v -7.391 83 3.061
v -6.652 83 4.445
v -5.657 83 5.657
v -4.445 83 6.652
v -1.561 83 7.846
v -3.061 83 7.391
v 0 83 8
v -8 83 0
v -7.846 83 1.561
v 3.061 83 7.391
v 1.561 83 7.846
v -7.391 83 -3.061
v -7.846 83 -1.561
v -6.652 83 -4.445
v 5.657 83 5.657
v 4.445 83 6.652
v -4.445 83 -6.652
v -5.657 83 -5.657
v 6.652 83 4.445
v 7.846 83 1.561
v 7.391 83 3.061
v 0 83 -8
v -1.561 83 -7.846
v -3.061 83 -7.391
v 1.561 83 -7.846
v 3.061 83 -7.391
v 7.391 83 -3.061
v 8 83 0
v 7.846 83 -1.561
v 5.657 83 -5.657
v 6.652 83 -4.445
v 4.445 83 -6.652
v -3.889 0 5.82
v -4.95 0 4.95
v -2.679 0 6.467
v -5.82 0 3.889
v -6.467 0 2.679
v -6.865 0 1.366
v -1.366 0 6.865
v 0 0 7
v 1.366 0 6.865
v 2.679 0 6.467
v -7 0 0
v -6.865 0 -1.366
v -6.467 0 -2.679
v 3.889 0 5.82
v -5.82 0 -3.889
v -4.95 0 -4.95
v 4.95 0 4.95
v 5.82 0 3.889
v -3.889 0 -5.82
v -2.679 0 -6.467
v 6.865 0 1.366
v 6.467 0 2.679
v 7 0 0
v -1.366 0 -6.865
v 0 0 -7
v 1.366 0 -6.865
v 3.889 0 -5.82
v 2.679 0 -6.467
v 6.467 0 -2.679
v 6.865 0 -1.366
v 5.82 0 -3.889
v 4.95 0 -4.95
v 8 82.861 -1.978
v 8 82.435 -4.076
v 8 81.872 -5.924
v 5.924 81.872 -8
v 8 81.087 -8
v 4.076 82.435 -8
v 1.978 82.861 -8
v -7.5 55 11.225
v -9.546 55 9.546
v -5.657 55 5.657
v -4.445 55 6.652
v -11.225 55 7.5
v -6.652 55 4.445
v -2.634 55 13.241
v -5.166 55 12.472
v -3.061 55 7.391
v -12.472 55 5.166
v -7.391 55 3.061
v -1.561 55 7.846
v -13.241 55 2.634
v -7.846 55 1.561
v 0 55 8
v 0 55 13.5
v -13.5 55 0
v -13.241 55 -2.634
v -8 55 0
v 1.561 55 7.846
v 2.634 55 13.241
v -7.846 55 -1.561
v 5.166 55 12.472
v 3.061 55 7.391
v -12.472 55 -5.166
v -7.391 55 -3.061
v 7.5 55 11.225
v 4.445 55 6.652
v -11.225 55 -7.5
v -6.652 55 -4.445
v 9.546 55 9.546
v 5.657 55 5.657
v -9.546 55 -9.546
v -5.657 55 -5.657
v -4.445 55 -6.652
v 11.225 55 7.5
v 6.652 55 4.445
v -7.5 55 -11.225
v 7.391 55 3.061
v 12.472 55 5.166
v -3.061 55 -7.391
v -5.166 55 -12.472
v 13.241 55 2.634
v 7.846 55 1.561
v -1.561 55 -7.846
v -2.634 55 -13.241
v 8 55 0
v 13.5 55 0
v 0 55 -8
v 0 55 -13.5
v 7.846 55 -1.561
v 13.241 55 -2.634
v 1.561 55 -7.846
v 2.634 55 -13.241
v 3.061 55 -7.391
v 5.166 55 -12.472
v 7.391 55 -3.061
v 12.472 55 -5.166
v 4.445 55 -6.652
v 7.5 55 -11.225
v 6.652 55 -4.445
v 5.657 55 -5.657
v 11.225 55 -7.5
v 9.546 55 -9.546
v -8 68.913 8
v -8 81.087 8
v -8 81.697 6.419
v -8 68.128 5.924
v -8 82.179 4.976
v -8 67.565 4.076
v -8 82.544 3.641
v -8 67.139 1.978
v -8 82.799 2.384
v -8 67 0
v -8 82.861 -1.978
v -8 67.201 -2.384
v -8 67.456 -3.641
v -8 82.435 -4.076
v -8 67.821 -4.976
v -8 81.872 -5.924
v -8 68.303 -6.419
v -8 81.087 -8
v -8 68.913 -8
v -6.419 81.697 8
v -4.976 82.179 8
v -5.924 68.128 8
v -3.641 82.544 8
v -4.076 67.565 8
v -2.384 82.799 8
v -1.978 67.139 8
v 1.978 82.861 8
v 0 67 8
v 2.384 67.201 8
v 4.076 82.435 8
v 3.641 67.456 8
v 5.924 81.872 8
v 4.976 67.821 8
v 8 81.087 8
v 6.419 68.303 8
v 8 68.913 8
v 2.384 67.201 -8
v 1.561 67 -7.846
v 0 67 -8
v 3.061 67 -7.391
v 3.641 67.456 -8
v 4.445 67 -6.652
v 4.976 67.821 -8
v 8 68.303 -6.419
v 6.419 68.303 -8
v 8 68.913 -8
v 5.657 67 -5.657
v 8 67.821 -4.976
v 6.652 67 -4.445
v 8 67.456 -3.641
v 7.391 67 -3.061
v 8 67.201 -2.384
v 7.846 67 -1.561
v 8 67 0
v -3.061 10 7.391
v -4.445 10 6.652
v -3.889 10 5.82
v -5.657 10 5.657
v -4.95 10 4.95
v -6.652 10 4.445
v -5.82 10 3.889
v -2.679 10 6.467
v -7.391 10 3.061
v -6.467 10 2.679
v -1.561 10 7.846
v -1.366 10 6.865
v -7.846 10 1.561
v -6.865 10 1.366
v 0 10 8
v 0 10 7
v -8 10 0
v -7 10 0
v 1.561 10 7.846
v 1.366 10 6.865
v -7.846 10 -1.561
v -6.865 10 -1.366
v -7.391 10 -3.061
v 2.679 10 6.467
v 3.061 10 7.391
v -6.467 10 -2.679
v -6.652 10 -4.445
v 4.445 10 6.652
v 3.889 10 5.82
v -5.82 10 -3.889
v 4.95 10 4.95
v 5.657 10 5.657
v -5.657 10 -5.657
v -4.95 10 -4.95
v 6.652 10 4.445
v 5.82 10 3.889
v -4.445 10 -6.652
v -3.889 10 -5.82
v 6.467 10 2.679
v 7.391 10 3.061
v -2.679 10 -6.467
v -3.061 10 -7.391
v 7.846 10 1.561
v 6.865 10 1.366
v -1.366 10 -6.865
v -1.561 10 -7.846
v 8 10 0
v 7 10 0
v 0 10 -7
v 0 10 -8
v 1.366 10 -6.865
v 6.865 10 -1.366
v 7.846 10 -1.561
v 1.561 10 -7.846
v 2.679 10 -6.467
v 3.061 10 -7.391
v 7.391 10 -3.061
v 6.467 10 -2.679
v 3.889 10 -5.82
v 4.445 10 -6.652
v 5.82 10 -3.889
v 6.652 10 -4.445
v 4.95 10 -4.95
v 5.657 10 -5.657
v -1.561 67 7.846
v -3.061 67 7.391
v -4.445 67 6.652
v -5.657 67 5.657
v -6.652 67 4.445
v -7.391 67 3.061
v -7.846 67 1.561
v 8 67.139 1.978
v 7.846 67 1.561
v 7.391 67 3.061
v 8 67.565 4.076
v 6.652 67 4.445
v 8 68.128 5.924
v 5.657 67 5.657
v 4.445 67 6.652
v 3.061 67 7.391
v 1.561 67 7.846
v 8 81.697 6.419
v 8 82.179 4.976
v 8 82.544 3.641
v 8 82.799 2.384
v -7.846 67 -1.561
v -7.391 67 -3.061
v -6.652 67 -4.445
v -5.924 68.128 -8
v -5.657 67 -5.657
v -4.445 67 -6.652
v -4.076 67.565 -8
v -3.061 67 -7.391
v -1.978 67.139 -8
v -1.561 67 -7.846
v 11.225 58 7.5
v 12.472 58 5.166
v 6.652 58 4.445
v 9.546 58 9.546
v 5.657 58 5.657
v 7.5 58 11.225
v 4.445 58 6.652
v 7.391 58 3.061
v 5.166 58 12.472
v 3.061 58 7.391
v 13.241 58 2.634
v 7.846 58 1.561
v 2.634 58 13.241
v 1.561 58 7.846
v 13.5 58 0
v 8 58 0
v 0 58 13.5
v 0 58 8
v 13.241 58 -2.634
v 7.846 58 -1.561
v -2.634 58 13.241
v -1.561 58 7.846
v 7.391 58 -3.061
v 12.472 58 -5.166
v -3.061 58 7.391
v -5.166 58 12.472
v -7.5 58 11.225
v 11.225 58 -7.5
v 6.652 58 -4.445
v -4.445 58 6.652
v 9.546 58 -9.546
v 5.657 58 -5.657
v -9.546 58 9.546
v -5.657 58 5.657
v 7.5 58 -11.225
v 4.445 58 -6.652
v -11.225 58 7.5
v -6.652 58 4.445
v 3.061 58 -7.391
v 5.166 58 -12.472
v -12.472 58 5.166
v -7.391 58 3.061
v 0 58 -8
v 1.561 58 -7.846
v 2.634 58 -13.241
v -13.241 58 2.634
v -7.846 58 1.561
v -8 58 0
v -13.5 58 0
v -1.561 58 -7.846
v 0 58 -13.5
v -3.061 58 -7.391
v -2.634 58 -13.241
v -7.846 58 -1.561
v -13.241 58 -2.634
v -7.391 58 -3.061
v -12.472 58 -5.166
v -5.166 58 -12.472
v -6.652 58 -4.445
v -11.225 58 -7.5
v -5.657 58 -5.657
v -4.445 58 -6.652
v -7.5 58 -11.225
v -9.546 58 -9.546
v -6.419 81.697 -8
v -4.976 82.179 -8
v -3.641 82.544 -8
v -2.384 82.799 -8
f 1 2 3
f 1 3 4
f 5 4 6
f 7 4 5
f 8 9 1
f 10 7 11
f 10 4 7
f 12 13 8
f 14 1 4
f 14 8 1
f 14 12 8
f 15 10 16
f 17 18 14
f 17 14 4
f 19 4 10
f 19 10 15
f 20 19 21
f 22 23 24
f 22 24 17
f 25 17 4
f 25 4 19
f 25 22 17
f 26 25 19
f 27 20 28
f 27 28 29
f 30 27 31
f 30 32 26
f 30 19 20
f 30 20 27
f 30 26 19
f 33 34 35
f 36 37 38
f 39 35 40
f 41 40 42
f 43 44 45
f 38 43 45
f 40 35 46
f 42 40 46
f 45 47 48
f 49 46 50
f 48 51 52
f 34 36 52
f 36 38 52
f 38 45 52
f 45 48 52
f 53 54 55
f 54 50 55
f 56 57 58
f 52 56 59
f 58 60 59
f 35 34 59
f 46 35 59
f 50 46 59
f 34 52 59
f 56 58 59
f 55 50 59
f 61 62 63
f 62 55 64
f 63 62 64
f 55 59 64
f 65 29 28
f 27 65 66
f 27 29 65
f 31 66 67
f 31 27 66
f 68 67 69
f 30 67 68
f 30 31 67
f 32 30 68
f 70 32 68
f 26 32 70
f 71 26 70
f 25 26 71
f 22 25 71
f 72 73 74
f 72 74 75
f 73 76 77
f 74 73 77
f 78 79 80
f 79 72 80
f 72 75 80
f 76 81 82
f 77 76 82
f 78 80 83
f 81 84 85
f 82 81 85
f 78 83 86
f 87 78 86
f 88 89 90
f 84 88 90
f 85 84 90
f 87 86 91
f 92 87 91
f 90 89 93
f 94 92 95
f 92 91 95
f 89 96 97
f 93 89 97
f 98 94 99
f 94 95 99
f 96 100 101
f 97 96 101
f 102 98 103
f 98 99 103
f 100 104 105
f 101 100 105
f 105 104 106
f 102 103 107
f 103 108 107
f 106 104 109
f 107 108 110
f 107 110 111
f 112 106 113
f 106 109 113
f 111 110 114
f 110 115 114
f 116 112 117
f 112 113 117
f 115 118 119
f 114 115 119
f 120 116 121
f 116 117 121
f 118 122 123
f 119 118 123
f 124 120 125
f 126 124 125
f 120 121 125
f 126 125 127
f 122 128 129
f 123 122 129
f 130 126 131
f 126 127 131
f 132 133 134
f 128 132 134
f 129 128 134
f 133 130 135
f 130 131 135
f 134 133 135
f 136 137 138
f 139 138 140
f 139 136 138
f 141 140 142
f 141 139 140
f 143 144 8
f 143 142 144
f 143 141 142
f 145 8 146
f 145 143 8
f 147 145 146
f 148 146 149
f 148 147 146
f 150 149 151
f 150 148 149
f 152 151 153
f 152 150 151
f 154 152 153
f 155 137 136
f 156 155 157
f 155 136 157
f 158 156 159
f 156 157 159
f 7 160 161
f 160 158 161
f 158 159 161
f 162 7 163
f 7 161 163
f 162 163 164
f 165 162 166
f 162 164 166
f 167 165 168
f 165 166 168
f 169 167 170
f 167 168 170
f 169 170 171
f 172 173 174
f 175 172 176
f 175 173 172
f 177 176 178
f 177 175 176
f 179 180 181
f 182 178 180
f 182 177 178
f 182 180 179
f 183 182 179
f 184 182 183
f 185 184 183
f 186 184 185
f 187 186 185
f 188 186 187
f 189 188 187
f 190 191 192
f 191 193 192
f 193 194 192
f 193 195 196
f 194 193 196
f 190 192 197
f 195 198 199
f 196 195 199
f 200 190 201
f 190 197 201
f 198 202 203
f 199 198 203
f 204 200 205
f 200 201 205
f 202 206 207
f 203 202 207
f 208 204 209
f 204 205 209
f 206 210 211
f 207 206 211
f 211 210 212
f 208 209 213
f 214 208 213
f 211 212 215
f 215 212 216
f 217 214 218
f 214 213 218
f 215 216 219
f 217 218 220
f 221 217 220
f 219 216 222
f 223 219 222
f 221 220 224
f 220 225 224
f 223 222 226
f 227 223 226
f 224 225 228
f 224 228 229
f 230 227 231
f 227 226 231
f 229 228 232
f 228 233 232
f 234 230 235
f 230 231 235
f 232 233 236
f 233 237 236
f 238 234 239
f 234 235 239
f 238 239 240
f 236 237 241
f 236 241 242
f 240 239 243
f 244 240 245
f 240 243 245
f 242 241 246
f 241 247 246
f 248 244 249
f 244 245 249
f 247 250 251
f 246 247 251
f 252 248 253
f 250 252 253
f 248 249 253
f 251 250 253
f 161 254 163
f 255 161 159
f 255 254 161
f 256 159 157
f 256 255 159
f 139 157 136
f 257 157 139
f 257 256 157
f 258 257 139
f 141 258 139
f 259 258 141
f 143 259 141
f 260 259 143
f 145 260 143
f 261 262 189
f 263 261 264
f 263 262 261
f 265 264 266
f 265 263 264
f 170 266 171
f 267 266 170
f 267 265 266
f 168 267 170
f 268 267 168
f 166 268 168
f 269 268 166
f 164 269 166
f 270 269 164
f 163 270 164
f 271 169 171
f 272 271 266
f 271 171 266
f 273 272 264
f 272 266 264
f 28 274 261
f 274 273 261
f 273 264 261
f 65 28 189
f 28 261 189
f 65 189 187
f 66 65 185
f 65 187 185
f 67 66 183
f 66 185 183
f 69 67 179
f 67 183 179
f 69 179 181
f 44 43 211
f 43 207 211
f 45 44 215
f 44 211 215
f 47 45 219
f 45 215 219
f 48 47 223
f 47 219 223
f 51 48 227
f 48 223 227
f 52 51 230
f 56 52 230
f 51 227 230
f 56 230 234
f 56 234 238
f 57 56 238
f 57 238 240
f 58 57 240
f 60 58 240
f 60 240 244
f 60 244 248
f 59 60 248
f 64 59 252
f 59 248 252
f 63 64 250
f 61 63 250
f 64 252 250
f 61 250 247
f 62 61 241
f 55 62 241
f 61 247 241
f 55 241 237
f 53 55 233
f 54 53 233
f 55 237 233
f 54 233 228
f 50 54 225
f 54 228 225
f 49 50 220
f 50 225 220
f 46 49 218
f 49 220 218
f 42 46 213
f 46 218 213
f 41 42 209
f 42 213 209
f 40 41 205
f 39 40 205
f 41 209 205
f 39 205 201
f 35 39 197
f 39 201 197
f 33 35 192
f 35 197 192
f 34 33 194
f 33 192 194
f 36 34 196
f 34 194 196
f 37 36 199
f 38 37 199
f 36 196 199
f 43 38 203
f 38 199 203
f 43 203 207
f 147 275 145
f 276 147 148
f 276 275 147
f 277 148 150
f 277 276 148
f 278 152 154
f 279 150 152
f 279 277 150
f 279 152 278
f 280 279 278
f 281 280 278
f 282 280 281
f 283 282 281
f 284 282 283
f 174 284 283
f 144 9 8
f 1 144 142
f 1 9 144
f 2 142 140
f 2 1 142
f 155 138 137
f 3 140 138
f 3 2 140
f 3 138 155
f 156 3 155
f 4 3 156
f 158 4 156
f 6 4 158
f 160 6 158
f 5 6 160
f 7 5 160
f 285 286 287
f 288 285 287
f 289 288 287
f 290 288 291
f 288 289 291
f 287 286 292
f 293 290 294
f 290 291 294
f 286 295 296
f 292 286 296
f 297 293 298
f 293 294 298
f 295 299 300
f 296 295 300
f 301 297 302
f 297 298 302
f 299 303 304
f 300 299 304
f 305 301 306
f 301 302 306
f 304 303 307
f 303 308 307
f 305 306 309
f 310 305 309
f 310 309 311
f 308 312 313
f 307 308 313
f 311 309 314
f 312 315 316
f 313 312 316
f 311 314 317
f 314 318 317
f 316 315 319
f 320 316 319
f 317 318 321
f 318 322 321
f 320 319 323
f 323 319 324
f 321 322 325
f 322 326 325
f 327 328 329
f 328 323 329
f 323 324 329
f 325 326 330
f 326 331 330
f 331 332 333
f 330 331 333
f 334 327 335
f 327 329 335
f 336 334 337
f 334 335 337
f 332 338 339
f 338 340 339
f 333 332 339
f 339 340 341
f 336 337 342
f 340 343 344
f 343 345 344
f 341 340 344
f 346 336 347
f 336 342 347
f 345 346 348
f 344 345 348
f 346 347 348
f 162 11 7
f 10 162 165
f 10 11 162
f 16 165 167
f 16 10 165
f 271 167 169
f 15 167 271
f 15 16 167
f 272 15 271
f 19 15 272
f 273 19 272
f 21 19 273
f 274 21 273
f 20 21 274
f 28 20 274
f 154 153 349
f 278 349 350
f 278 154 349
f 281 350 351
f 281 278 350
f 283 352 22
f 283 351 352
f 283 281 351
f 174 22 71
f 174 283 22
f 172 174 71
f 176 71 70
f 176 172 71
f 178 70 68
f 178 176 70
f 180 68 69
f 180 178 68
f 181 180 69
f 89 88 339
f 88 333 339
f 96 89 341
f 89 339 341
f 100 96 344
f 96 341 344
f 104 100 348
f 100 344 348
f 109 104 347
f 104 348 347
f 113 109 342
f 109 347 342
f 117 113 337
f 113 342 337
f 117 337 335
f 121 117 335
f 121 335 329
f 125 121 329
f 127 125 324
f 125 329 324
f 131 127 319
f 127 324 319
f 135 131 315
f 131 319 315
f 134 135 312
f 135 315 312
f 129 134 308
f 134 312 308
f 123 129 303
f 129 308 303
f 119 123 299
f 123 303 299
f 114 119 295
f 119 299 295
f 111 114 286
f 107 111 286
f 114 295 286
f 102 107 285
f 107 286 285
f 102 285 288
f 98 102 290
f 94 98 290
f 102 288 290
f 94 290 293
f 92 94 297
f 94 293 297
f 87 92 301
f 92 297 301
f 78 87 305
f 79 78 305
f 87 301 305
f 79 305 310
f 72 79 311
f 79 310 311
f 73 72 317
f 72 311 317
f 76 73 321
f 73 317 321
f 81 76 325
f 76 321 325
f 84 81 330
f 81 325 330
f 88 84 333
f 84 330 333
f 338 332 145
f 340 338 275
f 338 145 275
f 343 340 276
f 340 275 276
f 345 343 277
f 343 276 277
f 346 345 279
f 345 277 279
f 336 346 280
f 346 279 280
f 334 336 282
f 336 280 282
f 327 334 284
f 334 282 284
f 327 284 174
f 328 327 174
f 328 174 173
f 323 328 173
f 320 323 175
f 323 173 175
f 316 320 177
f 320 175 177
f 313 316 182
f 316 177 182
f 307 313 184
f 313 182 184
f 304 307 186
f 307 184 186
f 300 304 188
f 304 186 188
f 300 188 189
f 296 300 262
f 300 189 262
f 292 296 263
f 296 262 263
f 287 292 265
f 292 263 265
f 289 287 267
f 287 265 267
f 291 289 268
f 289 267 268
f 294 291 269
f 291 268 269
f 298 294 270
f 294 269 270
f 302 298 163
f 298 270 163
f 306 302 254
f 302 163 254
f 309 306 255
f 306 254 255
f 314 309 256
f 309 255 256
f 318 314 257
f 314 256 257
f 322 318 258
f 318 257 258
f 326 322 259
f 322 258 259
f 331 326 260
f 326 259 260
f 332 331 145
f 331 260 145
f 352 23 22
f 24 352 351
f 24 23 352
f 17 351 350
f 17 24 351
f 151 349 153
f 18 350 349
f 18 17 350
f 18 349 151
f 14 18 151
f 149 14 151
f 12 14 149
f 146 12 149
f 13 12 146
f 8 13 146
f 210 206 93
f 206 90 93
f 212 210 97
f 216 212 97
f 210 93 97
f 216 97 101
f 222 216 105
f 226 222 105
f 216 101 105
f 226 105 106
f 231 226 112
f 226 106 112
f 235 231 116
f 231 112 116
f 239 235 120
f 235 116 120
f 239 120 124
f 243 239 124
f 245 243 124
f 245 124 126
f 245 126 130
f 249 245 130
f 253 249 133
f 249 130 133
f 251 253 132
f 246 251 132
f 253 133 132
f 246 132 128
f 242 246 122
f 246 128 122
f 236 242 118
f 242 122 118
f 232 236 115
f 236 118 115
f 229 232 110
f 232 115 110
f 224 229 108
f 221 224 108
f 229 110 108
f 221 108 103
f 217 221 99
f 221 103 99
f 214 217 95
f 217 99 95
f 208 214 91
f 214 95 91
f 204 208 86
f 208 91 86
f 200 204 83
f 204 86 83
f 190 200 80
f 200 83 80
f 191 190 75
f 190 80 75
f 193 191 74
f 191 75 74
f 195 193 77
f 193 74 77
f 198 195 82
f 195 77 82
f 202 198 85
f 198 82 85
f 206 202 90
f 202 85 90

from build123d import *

# Parameters (mm, degrees)
SKETCH2_W           = 16
SKETCH2_H           = 16
BOSS_EXTRUDE1_DEPTH = 16
SKETCH3_OUTSIDE_W   = 81.914
SKETCH3_OUTSIDE_H   = 81.914
SKETCH3_OUTSIDE_R   = 8
CUT_EXTRUDE1_DEPTH  = 10
CUT_EXTRUDE1_DRAFT  = -60
SKETCH4_OUTSIDE_W   = 81.914
SKETCH4_OUTSIDE_H   = 81.914
SKETCH4_OUTSIDE_R   = 8
CUT_EXTRUDE2_DEPTH  = 10
CUT_EXTRUDE2_DRAFT  = -60


with BuildPart() as part:
    # Sketch1 → Revolve1 (revolve)
    with BuildSketch(Plane.XY):
        Polygon((0, 0), (-7, 0), (-7, 10), (-8, 10), (-8, 55), (-13.5, 55), (-13.5, 58), (-8, 58), (-8, 67), (0, 67), align=None)
    revolve(axis=Axis((0, 67, 0), (0, -1, 0)))

    # Sketch2 → Boss-Extrude1 (add)
    with BuildSketch(Plane(origin=(0, 67, 0), x_dir=(1, 0, 0), z_dir=(0, 1, 0))):
        Rectangle(SKETCH2_W, SKETCH2_H)
    extrude(amount=BOSS_EXTRUDE1_DEPTH)


with BuildPart() as cut_extrude1_tool:
    # Sketch3 outside → Cut-Extrude1 (with draft: the straight prism first)
    with BuildSketch(Plane(origin=(0, 83, 0), x_dir=(1, 0, 0), z_dir=(0, 1, 0))):
        Rectangle(SKETCH3_OUTSIDE_W, SKETCH3_OUTSIDE_H)
        with Locations(Location((0, 0, 0), (0, 0, 180))):
            Circle(SKETCH3_OUTSIDE_R, mode=Mode.SUBTRACT)
    extrude(amount=-CUT_EXTRUDE1_DEPTH)
    # Cut-Extrude1: the draft: its side faces are tilted about the plane it starts from
    cut_extrude1_sides = [cut_extrude1_tool.faces().sort_by_distance(p)[0] for p in [
        (0, 78, 40.957),
        (40.957, 78, 0),
        (0, 78, -40.957),
        (-40.957, 78, 0),
        (8, 78, 0),
    ]]
    draft(cut_extrude1_sides, Plane(origin=(0, 83, 0), x_dir=(1, 0, 0), z_dir=(0, 1, 0)), CUT_EXTRUDE1_DRAFT)


with BuildPart() as part_1:
    add(part.part)

    # Cut-Extrude1: cut by cut_extrude1_tool
    add(cut_extrude1_tool.part, mode=Mode.SUBTRACT)


with BuildPart() as cut_extrude2_tool:
    # Sketch4 outside → Cut-Extrude2 (with draft: the straight prism first)
    with BuildSketch(Plane.XZ.offset(-67)):
        Rectangle(SKETCH4_OUTSIDE_W, SKETCH4_OUTSIDE_H)
        with Locations(Location((0, 0, 0), (0, 0, 180))):
            Circle(SKETCH4_OUTSIDE_R, mode=Mode.SUBTRACT)
    extrude(amount=-CUT_EXTRUDE2_DEPTH)
    # Cut-Extrude2: the draft: its side faces are tilted about the plane it starts from
    cut_extrude2_sides = [cut_extrude2_tool.faces().sort_by_distance(p)[0] for p in [
        (0, 72, -40.957),
        (40.957, 72, 0),
        (0, 72, 40.957),
        (-40.957, 72, 0),
        (8, 72, 0),
    ]]
    draft(cut_extrude2_sides, Plane.XZ.offset(-67), CUT_EXTRUDE2_DRAFT)


with BuildPart() as part_2:
    add(part_1.part)

    # Cut-Extrude2: cut by cut_extrude2_tool
    add(cut_extrude2_tool.part, mode=Mode.SUBTRACT)


solid = part_2.part
